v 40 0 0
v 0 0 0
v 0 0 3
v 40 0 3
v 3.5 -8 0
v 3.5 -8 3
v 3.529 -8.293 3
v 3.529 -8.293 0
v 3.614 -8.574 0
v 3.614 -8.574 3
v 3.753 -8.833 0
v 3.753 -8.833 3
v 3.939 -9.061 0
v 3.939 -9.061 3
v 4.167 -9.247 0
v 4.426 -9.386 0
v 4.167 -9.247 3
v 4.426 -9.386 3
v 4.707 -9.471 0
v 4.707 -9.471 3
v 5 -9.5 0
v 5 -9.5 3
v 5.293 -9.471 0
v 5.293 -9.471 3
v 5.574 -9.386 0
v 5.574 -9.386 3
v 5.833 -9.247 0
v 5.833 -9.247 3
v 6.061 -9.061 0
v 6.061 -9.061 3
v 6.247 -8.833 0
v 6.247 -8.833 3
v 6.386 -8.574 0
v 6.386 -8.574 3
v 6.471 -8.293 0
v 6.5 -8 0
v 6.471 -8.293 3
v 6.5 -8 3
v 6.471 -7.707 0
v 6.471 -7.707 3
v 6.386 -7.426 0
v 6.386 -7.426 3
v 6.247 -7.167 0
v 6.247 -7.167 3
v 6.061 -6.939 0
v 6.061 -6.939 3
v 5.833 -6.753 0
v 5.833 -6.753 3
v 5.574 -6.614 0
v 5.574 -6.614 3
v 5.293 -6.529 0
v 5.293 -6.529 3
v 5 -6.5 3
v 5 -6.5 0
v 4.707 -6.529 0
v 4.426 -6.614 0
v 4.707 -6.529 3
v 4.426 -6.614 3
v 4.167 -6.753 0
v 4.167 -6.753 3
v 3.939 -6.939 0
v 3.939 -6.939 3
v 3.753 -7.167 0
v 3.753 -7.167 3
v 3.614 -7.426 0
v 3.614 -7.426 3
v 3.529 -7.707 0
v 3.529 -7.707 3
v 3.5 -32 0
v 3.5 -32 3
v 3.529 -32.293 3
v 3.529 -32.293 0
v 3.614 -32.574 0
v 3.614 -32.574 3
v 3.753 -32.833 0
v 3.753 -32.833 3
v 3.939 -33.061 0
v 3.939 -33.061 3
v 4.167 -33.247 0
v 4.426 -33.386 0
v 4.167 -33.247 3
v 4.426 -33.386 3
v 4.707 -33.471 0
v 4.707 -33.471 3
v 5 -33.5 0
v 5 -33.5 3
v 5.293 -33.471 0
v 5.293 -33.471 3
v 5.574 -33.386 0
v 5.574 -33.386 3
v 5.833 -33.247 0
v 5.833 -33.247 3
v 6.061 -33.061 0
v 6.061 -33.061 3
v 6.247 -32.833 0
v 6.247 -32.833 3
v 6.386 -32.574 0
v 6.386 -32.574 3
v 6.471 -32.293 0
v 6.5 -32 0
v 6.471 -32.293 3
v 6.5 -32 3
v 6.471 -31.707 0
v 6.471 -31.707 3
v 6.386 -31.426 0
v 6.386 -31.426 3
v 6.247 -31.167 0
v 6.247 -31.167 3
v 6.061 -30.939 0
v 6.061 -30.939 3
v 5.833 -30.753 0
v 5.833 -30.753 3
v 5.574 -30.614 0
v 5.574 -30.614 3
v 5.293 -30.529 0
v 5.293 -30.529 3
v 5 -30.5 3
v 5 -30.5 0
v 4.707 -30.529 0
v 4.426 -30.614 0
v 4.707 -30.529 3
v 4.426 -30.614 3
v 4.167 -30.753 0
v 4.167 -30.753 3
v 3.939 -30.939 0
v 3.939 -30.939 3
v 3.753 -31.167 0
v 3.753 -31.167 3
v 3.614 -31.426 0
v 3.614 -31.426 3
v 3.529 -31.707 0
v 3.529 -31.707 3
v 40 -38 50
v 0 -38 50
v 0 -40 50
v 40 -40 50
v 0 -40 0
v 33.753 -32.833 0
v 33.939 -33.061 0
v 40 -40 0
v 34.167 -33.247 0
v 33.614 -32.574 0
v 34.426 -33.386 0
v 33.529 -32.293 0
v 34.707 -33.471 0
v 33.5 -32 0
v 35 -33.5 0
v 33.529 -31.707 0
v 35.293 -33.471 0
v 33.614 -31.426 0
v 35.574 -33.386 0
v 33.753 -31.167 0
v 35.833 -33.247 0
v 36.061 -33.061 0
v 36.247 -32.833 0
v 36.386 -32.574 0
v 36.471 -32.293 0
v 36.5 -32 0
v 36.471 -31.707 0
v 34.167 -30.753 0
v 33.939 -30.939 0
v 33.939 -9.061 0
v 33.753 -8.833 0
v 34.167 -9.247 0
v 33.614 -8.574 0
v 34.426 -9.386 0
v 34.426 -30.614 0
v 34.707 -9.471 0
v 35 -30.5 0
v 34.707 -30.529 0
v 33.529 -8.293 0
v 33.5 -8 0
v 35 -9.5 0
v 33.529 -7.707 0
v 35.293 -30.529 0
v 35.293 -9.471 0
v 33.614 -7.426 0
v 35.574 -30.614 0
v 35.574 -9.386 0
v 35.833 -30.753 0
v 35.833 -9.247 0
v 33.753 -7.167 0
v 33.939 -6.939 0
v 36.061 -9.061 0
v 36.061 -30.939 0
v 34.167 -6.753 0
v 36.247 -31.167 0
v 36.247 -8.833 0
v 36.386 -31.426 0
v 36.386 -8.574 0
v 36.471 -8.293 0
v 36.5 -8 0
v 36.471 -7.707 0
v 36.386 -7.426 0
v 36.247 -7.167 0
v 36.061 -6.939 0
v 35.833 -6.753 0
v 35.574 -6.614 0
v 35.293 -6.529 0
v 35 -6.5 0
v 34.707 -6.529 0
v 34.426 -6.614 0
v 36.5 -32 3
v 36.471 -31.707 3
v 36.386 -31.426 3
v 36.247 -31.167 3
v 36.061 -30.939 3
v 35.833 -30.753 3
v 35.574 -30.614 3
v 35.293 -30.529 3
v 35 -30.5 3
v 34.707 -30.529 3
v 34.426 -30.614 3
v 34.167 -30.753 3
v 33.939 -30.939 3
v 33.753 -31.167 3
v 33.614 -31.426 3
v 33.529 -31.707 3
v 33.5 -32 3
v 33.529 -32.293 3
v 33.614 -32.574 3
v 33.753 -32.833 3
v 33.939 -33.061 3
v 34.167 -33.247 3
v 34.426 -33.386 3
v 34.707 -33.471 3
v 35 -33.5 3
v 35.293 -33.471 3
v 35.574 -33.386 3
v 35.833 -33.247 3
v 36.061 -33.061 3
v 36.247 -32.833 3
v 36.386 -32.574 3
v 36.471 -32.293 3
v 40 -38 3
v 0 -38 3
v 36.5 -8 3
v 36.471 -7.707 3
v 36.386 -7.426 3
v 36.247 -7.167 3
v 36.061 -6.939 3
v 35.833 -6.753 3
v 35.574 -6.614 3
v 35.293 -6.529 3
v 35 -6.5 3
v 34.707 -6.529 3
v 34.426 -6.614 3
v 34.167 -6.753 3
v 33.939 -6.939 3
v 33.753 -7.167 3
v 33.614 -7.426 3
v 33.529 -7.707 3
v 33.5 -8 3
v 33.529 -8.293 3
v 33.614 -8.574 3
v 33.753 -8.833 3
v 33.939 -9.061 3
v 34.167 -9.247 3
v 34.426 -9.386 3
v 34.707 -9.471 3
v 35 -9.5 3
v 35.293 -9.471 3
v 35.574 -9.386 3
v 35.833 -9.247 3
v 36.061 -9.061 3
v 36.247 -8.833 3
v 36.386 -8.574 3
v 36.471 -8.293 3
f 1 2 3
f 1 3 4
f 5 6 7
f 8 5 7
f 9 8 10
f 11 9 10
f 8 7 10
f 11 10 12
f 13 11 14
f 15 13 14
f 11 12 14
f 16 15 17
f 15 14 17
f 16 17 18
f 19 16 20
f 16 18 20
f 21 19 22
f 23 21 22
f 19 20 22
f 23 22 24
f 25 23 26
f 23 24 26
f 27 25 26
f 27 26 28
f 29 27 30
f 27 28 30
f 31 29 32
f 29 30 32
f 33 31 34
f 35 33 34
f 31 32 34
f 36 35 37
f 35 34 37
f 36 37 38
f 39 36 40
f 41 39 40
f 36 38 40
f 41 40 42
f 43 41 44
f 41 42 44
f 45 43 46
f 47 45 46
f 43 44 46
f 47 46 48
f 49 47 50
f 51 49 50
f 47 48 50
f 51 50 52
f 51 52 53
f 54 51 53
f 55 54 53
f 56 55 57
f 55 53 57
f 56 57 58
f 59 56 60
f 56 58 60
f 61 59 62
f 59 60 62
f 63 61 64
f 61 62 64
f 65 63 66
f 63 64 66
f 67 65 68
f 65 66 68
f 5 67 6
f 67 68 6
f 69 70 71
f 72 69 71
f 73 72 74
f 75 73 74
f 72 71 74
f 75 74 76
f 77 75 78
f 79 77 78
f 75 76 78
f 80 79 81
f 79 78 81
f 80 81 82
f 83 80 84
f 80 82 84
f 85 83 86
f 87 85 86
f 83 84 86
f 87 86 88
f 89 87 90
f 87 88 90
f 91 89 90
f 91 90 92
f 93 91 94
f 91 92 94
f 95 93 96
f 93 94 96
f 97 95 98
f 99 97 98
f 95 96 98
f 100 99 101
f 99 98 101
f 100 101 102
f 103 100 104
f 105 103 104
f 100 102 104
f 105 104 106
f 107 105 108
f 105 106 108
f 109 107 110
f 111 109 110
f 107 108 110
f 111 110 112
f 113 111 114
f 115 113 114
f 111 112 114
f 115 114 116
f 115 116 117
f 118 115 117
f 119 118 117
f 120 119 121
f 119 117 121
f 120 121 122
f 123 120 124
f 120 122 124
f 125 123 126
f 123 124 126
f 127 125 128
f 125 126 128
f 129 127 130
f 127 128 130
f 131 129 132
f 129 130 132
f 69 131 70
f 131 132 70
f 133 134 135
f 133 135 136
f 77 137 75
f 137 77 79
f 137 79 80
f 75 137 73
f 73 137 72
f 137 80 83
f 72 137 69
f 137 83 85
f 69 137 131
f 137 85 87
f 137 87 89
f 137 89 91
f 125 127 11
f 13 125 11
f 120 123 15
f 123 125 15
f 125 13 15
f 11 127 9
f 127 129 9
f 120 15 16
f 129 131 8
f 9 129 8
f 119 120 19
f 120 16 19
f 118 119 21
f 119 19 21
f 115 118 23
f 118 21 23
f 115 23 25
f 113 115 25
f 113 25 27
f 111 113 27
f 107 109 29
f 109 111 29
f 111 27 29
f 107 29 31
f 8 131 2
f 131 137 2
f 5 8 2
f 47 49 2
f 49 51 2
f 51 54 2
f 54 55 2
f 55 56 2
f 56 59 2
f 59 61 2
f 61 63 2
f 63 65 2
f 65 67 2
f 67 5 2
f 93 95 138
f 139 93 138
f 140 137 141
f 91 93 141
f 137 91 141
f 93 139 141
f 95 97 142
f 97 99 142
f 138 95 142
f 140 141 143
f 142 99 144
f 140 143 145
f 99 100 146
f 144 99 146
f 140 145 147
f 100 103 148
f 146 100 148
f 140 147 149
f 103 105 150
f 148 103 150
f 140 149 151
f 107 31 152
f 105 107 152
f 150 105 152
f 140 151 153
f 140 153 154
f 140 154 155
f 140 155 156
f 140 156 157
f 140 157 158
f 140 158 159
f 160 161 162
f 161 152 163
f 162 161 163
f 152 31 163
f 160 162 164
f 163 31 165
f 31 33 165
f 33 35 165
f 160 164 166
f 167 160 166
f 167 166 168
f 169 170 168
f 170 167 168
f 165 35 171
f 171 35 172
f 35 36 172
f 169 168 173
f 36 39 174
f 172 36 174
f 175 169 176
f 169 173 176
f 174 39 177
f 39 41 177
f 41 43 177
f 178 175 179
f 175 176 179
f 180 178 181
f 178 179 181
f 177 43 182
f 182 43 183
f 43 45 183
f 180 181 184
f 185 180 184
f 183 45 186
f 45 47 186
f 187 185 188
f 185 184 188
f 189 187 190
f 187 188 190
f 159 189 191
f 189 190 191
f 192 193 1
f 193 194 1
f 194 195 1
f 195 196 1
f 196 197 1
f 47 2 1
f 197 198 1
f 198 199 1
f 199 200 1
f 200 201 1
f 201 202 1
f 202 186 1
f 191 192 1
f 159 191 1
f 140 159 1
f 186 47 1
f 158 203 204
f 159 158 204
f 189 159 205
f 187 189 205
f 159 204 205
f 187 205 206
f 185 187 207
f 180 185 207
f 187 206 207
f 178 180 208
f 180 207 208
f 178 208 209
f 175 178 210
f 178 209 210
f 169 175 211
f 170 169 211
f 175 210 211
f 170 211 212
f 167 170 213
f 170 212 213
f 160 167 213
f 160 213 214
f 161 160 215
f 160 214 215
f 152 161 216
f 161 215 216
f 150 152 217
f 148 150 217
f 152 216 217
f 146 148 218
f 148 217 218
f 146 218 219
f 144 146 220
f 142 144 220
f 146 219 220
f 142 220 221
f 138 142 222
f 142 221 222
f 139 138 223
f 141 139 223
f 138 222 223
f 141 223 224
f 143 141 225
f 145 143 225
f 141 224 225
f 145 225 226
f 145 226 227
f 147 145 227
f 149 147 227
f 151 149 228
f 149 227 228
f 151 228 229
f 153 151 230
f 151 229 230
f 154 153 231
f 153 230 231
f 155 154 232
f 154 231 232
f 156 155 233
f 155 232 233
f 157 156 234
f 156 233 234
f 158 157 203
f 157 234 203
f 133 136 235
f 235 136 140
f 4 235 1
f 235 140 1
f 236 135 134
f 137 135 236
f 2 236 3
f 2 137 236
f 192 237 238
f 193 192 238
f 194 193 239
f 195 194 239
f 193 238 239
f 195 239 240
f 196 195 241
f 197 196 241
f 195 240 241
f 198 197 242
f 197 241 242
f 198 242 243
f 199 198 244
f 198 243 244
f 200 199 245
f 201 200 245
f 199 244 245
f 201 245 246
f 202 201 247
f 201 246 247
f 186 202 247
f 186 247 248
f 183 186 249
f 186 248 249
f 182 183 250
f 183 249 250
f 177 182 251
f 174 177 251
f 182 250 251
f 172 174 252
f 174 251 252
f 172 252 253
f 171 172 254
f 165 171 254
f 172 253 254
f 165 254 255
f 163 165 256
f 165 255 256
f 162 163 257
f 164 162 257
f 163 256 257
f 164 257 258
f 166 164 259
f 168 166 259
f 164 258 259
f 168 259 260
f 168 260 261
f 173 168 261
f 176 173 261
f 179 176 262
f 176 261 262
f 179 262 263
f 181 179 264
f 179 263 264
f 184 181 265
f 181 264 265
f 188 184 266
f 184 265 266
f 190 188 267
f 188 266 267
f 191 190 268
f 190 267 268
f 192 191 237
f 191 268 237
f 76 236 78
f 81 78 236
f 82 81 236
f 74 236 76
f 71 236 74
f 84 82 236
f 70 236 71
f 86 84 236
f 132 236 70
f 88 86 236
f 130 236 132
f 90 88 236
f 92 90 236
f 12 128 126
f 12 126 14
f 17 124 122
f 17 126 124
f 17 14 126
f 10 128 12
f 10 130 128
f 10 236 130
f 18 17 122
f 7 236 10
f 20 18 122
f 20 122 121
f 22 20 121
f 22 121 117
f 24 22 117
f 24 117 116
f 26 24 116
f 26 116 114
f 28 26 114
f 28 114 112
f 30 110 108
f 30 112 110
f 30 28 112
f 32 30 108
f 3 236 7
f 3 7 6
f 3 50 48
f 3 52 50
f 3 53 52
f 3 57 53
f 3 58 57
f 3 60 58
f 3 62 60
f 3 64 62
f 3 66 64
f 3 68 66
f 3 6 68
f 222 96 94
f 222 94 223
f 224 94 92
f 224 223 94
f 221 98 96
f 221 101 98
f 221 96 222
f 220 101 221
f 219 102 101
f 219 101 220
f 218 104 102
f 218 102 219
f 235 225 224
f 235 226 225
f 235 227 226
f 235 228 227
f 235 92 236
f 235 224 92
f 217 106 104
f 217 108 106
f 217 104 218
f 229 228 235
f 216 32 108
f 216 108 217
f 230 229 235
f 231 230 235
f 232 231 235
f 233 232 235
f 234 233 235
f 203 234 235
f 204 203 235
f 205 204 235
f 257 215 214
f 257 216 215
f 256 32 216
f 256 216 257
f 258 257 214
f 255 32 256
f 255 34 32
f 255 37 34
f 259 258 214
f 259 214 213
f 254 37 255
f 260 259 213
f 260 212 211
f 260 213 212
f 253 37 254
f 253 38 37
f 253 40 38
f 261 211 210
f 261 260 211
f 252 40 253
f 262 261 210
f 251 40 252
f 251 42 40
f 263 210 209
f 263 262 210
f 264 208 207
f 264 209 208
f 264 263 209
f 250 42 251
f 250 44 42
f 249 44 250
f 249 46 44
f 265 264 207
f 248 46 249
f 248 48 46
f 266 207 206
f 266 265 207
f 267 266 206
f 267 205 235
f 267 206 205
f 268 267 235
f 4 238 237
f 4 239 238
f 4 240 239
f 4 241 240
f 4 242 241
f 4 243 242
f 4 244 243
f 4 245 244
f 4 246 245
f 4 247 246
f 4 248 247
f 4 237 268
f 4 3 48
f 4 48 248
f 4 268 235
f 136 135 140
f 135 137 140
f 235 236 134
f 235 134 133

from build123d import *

# Parameters (mm, degrees)
SKETCH_1_W          = 40
SKETCH_1_H          = 40
EXTRUDE_1_DEPTH     = 3
SKETCH_2_R          = 1.5
CUT_EXTRUDE_1_DEPTH = 3
SKETCH_3_W          = 40
SKETCH_3_H          = 2
EXTRUDE_2_DEPTH     = 47


with BuildPart() as part:
    # 草图1 → 凸台-拉伸1 (new body)
    with BuildSketch(Plane.XY):
        with Locations((20, -20)):
            Rectangle(SKETCH_1_W, SKETCH_1_H)
    extrude(amount=EXTRUDE_1_DEPTH)

    # 草图2 → 切除-拉伸1 (cut)
    with BuildSketch(Plane.XY.offset(3)):
        with Locations((35, -8)):
            Circle(SKETCH_2_R)
        with Locations(Location((5, -8, 0), (0, 0, 180))):
            Circle(SKETCH_2_R)
        with Locations((35, -32)):
            Circle(SKETCH_2_R)
        with Locations(Location((5, -32, 0), (0, 0, 180))):
            Circle(SKETCH_2_R)
    extrude(amount=-CUT_EXTRUDE_1_DEPTH, mode=Mode.SUBTRACT)

    # 草图3 → 凸台-拉伸2 (add)
    with BuildSketch(Plane.XY.offset(3)):
        with Locations((20, -39)):
            Rectangle(SKETCH_3_W, SKETCH_3_H)
    extrude(amount=EXTRUDE_2_DEPTH)


solid = part.part
